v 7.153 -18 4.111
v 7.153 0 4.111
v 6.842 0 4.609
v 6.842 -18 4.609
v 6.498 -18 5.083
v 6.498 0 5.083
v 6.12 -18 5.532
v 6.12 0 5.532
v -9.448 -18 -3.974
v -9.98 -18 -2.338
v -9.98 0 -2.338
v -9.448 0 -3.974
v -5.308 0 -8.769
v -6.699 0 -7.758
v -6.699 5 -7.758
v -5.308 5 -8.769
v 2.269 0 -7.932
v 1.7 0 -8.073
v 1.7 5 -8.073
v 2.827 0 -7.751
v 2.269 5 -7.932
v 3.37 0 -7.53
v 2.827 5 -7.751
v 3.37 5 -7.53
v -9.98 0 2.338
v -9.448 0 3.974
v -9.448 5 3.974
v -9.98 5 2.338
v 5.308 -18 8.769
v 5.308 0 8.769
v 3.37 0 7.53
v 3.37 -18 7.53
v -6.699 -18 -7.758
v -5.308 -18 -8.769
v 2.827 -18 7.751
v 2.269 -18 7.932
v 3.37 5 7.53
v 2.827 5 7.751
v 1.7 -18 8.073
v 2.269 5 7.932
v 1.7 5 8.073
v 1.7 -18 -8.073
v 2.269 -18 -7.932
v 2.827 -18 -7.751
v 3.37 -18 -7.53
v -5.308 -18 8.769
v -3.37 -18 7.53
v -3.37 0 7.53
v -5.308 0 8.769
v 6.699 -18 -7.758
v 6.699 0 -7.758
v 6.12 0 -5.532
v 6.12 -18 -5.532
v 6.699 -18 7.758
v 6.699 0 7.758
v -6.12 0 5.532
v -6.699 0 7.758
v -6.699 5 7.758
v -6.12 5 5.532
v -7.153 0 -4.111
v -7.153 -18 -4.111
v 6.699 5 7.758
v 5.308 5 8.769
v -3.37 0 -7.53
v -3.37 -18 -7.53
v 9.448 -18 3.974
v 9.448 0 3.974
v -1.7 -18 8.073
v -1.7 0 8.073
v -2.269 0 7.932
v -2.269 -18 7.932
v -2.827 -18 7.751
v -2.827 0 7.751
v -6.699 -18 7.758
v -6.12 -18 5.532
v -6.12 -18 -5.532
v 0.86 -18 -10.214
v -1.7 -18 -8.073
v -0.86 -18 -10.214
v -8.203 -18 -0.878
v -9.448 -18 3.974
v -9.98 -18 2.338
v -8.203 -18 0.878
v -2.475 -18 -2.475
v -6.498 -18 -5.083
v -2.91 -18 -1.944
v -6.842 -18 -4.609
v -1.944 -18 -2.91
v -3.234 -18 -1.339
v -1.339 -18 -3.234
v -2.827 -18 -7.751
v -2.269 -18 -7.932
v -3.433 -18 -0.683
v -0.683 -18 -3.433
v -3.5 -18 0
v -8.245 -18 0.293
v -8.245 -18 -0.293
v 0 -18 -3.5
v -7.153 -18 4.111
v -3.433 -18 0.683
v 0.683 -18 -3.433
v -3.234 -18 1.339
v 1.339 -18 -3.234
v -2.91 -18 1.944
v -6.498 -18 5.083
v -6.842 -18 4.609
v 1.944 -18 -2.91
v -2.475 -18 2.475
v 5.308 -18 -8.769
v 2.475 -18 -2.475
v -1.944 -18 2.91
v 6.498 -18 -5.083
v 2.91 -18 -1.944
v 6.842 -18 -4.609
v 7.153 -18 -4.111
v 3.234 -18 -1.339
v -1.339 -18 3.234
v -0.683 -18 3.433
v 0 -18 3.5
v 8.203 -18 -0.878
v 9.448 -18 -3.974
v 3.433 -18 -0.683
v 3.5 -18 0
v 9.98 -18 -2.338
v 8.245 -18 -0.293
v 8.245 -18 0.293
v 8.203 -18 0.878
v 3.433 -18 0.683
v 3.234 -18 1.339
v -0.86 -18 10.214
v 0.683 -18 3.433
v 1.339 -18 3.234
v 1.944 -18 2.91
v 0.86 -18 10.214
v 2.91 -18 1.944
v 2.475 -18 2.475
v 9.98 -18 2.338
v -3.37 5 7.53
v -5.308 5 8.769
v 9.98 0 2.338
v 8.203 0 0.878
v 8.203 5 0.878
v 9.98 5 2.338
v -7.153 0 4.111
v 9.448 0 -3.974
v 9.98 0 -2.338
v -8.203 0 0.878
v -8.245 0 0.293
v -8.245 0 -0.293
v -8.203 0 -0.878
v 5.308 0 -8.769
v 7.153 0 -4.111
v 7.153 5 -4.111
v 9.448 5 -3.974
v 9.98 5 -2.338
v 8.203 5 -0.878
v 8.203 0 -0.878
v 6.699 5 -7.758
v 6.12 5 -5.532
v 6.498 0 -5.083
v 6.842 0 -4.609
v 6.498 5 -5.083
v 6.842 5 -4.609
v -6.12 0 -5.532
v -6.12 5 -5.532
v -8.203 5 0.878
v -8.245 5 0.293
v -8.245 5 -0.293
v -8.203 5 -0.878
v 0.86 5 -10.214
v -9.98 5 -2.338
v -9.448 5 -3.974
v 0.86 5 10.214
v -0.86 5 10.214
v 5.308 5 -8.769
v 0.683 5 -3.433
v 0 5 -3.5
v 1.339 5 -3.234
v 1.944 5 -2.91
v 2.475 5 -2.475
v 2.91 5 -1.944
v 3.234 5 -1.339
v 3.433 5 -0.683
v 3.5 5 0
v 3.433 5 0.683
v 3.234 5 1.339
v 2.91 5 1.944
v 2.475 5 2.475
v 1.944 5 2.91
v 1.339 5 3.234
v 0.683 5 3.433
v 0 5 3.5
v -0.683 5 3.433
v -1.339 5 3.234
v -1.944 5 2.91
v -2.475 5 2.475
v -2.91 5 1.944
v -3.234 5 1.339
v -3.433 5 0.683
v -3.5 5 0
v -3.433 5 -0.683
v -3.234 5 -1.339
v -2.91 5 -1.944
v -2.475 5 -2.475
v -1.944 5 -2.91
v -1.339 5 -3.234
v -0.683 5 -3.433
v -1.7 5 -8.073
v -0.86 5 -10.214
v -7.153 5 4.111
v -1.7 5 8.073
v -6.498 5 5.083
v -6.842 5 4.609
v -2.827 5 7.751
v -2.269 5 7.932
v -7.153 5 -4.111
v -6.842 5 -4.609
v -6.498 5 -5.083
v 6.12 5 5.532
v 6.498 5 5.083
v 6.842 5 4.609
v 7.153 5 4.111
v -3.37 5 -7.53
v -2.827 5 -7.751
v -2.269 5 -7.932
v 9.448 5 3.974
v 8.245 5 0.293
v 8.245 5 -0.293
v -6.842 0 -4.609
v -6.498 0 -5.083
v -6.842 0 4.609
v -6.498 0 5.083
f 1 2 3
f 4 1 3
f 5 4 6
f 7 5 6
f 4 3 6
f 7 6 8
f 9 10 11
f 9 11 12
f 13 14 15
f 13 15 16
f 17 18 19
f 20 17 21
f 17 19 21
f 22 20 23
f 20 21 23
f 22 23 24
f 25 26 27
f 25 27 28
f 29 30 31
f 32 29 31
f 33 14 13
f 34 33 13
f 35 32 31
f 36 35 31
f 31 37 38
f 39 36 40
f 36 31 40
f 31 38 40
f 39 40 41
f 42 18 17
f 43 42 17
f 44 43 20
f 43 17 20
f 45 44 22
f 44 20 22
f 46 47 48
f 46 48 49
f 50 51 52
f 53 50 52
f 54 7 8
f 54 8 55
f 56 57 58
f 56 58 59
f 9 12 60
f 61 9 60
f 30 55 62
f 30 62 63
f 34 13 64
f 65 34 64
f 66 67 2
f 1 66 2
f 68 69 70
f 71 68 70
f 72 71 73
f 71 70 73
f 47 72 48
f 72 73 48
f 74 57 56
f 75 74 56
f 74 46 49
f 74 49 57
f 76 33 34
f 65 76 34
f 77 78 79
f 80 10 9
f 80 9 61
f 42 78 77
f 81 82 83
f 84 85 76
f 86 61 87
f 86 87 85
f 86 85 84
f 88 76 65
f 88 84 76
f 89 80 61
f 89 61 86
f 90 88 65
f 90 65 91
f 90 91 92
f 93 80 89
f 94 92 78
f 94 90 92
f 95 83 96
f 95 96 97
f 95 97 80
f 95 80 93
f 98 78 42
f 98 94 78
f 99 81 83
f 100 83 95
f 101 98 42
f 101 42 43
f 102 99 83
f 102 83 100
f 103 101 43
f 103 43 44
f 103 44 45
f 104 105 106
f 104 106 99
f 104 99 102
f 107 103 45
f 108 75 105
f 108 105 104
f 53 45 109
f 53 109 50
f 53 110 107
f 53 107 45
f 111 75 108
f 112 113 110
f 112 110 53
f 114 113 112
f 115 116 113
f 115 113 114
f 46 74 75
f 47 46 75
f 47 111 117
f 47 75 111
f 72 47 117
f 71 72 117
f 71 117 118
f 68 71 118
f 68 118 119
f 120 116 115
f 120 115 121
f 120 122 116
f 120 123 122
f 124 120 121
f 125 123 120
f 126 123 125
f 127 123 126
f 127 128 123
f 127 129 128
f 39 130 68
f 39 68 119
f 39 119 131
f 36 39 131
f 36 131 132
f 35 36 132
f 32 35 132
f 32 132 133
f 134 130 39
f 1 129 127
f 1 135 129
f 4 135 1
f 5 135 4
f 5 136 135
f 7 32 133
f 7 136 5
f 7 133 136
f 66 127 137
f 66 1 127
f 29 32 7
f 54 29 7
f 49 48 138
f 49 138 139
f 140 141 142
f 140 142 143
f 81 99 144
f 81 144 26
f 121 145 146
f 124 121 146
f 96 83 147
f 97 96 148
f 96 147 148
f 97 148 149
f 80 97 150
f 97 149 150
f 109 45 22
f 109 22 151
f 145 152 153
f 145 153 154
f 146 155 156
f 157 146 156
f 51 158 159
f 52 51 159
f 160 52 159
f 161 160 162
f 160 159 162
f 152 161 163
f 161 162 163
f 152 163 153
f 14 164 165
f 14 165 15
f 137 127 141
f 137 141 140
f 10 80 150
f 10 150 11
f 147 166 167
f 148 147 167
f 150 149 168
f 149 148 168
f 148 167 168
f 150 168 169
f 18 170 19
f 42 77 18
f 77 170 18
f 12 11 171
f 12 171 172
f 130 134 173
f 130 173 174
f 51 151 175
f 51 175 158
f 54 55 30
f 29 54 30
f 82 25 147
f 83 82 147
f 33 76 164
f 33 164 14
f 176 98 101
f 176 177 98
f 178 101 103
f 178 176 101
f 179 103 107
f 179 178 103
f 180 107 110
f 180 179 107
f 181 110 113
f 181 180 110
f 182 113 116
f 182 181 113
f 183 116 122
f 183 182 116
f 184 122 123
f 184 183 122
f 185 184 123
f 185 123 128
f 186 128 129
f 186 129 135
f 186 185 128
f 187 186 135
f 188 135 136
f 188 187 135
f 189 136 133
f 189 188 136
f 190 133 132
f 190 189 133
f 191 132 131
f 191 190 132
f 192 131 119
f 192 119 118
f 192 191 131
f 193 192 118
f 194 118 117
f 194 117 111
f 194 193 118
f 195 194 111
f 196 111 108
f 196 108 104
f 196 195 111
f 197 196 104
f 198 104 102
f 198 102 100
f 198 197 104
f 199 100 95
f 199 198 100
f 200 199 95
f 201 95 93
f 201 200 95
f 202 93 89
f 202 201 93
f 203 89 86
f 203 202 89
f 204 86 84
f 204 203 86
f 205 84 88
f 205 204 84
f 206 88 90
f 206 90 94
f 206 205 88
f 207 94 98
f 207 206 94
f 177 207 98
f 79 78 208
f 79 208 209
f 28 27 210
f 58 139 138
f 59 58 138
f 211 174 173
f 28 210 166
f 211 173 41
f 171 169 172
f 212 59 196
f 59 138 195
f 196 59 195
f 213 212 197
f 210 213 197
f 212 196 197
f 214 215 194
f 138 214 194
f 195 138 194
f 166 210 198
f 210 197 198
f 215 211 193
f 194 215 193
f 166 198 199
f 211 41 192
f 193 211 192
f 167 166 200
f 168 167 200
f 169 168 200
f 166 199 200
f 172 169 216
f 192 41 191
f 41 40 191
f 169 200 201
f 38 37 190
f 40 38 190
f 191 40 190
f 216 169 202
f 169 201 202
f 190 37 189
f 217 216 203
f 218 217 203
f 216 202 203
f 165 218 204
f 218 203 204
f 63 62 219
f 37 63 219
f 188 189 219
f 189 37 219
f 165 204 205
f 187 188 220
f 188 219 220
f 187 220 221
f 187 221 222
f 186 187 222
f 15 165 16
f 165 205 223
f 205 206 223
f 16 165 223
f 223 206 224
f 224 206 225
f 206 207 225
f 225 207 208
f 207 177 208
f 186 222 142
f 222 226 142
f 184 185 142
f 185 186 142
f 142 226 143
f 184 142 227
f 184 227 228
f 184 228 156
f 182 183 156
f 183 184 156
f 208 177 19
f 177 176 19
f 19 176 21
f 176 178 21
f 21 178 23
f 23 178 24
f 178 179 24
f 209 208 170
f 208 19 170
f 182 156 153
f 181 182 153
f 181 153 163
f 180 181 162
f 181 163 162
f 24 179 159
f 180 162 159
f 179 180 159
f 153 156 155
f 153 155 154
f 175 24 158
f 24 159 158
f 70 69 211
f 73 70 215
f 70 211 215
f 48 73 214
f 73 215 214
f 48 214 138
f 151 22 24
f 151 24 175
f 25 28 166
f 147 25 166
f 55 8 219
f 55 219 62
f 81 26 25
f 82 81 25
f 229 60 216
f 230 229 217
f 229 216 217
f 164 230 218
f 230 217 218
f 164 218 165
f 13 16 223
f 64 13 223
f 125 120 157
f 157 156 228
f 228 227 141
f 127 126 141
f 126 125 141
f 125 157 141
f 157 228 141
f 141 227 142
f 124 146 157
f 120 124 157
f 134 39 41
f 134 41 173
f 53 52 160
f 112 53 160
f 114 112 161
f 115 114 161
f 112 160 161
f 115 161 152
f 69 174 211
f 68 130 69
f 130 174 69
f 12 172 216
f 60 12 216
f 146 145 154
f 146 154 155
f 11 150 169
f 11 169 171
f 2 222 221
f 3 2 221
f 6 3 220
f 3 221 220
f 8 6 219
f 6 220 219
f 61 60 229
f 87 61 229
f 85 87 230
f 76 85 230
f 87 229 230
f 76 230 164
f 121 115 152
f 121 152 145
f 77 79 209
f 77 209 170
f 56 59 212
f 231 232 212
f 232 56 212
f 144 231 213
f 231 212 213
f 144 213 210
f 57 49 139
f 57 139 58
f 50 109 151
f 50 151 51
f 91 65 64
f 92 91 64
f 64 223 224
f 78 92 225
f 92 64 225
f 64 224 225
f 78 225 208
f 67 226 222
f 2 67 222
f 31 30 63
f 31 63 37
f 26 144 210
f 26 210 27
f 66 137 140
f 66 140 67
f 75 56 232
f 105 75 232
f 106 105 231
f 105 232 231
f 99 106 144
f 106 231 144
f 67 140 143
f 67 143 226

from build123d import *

# Parameters (mm, degrees)
SKETCH1_R            = 3.5
BOSS_EXTRUDE1_DEPTH  = 5
SKETCH12_R           = 8.25
SKETCH12_R_2         = 3.5
BOSS_EXTRUDE6_DEPTH  = 5
BOSS_EXTRUDE9_DEPTH  = 5
CIRPATTERN2_COUNT    = 10
CUT_EXTRUDE1_START   = -10
SKETCH14_R           = 3.5
CUT_EXTRUDE1_DEPTH   = 10
SKETCH17_R           = 8.25
SKETCH17_R_2         = 3.5
BOSS_EXTRUDE10_DEPTH = 18


with BuildPart() as part:
    # Sketch1 → Boss-Extrude1 (new body)
    with BuildSketch(Plane(origin=(0, 0, 0), x_dir=(1, 0, 0), z_dir=(0, 1, 0))):
        with Locations(Location((0, 0, 0), (0, 0, 270))):
            Circle(SKETCH1_R)
    extrude(amount=BOSS_EXTRUDE1_DEPTH)

    # Sketch14 → Cut-Extrude1 (cut)
    with BuildSketch(Plane(origin=(0, 5, 0), x_dir=(1, 0, 0), z_dir=(0, 1, 0)).offset(CUT_EXTRUDE1_START)):
        with Locations(Location((0, 0, 0), (0, 0, 90))):
            Circle(SKETCH14_R)
    extrude(amount=CUT_EXTRUDE1_DEPTH, mode=Mode.SUBTRACT)


with BuildPart() as body_2:
    # Sketch12 → Boss-Extrude6 (new body)
    with BuildSketch(Plane(origin=(0, 5, 0), x_dir=(-1, 0, 0), z_dir=(0, -1, 0))):
        with Locations(Location((0, 0, 0), (0, 0, 90))):
            Circle(SKETCH12_R)
        with Locations(Location((0, 0, 0), (0, 0, 90))):
            Circle(SKETCH12_R_2, mode=Mode.SUBTRACT)
    extrude(amount=BOSS_EXTRUDE6_DEPTH)



with BuildPart() as body_3:
    # Sketch13 → Boss-Extrude9 (new body)
    with BuildSketch(Plane.XZ):
        with BuildLine():
            Line((1.7, 8.072948656), (0.86, 10.213858233))
            Line((0.86, 10.213858233), (-0.86, 10.213858233))
            Line((-0.86, 10.213858233), (-1.7, 8.072948656))
            ThreePointArc((-1.7, 8.072948656), (0, 8.25), (1.7, 8.072948656))
        make_face()
    extrude(amount=-BOSS_EXTRUDE9_DEPTH)


with BuildPart() as cirpattern2_1:
    # CirPattern2: pattern copy
    add(body_3.part.rotate(Axis((0, 0, 0), (0, 1, 0)), 1 * 360 / CIRPATTERN2_COUNT))


with BuildPart() as cirpattern2_2:
    # CirPattern2: pattern copy
    add(body_3.part.rotate(Axis((0, 0, 0), (0, 1, 0)), 2 * 360 / CIRPATTERN2_COUNT))


with BuildPart() as cirpattern2_3:
    # CirPattern2: pattern copy
    add(body_3.part.rotate(Axis((0, 0, 0), (0, 1, 0)), 3 * 360 / CIRPATTERN2_COUNT))


with BuildPart() as cirpattern2_4:
    # CirPattern2: pattern copy
    add(body_3.part.rotate(Axis((0, 0, 0), (0, 1, 0)), 4 * 360 / CIRPATTERN2_COUNT))


with BuildPart() as cirpattern2_5:
    # CirPattern2: pattern copy
    add(body_3.part.rotate(Axis((0, 0, 0), (0, 1, 0)), 5 * 360 / CIRPATTERN2_COUNT))


with BuildPart() as cirpattern2_6:
    # CirPattern2: pattern copy
    add(body_3.part.rotate(Axis((0, 0, 0), (0, 1, 0)), 6 * 360 / CIRPATTERN2_COUNT))


with BuildPart() as cirpattern2_7:
    # CirPattern2: pattern copy
    add(body_3.part.rotate(Axis((0, 0, 0), (0, 1, 0)), 7 * 360 / CIRPATTERN2_COUNT))


with BuildPart() as cirpattern2_8:
    # CirPattern2: pattern copy
    add(body_3.part.rotate(Axis((0, 0, 0), (0, 1, 0)), 8 * 360 / CIRPATTERN2_COUNT))


with BuildPart() as cirpattern2_9:
    # CirPattern2: pattern copy
    add(body_3.part.rotate(Axis((0, 0, 0), (0, 1, 0)), 9 * 360 / CIRPATTERN2_COUNT))


with BuildPart() as body_2_1:
    add(body_2.part)

    add(body_3.part)  # Boss-Extrude10 merges body 3

    add(cirpattern2_1.part)  # Boss-Extrude10 merges CirPattern2_1

    add(cirpattern2_2.part)  # Boss-Extrude10 merges CirPattern2_2

    add(cirpattern2_3.part)  # Boss-Extrude10 merges CirPattern2_3

    add(cirpattern2_4.part)  # Boss-Extrude10 merges CirPattern2_4

    add(cirpattern2_5.part)  # Boss-Extrude10 merges CirPattern2_5

    add(cirpattern2_6.part)  # Boss-Extrude10 merges CirPattern2_6

    add(cirpattern2_7.part)  # Boss-Extrude10 merges CirPattern2_7

    add(cirpattern2_8.part)  # Boss-Extrude10 merges CirPattern2_8

    add(cirpattern2_9.part)  # Boss-Extrude10 merges CirPattern2_9
    # Sketch17 → Boss-Extrude10 (add)
    # profile 1 of 11: a face of its own
    with BuildSketch(Plane.XZ):
        Circle(SKETCH17_R)
        with Locations(Location((0, 0, 0), (0, 0, 270))):
            Circle(SKETCH17_R_2, mode=Mode.SUBTRACT)
    # profile 2 of 11: a face of its own
    with BuildSketch(Plane.XZ):
        with BuildLine():
            ThreePointArc((-1.7, 8.072948656), (0, 8.25), (1.7, 8.072948656))
            Line((1.7, 8.072948656), (0.86, 10.213858233))
            Line((0.86, 10.213858233), (-0.86, 10.213858233))
            Line((-0.86, 10.213858233), (-1.7, 8.072948656))
        make_face()
    # profile 3 of 11: a face of its own
    with BuildSketch(Plane.XZ):
        with BuildLine():
            ThreePointArc((-6.120489053, 5.531917728), (-4.849228331, 6.674390204), (-3.369831272, 7.530387586))
            Line((-3.369831272, 7.530387586), (-5.307800623, 8.768680205))
            Line((-5.307800623, 8.768680205), (-6.699309853, 7.757689572))
            Line((-6.699309853, 7.757689572), (-6.120489053, 5.531917728))
        make_face()
    # profile 4 of 11: a face of its own
    with BuildSketch(Plane.XZ):
        with BuildLine():
            Line((-9.979711044, 2.338347168), (-8.203159315, 0.877882252))
            ThreePointArc((-8.203159315, 0.877882252), (-7.846216259, 2.549390204), (-7.152501534, 4.111474407))
            Line((-7.152501534, 4.111474407), (-9.448201814, 3.974164376))
            Line((-9.448201814, 3.974164376), (-9.979711044, 2.338347168))
        make_face()
    # profile 5 of 11: a face of its own
    with BuildSketch(Plane.XZ):
        with BuildLine():
            Line((-9.448201814, -3.974164376), (-7.152501534, -4.111474407))
            ThreePointArc((-7.152501534, -4.111474407), (-7.846216259, -2.549390204), (-8.203159315, -0.877882252))
            Line((-8.203159315, -0.877882252), (-9.979711044, -2.338347168))
            Line((-9.979711044, -2.338347168), (-9.448201814, -3.974164376))
        make_face()
    # profile 6 of 11: a face of its own
    with BuildSketch(Plane.XZ):
        with BuildLine():
            Line((-5.307800623, -8.768680205), (-3.369831272, -7.530387586))
            ThreePointArc((-3.369831272, -7.530387586), (-4.849228331, -6.674390204), (-6.120489053, -5.531917728))
            Line((-6.120489053, -5.531917728), (-6.699309853, -7.757689572))
            Line((-6.699309853, -7.757689572), (-5.307800623, -8.768680205))
        make_face()
    # profile 7 of 11: a face of its own
    with BuildSketch(Plane.XZ):
        with BuildLine():
            Line((0.86, -10.213858233), (1.7, -8.072948656))
            ThreePointArc((1.7, -8.072948656), (0, -8.25), (-1.7, -8.072948656))
            Line((-1.7, -8.072948656), (-0.86, -10.213858233))
            Line((-0.86, -10.213858233), (0.86, -10.213858233))
        make_face()
    # profile 8 of 11: a face of its own
    with BuildSketch(Plane.XZ):
        with BuildLine():
            Line((6.699309853, -7.757689572), (6.120489053, -5.531917728))
            ThreePointArc((6.120489053, -5.531917728), (4.849228331, -6.674390204), (3.369831272, -7.530387586))
            Line((3.369831272, -7.530387586), (5.307800623, -8.768680205))
            Line((5.307800623, -8.768680205), (6.699309853, -7.757689572))
        make_face()
    # profile 9 of 11: a face of its own
    with BuildSketch(Plane.XZ):
        with BuildLine():
            Line((7.152501534, -4.111474407), (9.448201814, -3.974164376))
            Line((9.448201814, -3.974164376), (9.979711044, -2.338347168))
            Line((9.979711044, -2.338347168), (8.203159315, -0.877882252))
            ThreePointArc((8.203159315, -0.877882252), (7.846216259, -2.549390204), (7.152501534, -4.111474407))
        make_face()
    # profile 10 of 11: a face of its own
    with BuildSketch(Plane.XZ):
        with BuildLine():
            ThreePointArc((7.152501534, 4.111474407), (7.846216259, 2.549390204), (8.203159315, 0.877882252))
            Line((8.203159315, 0.877882252), (9.979711044, 2.338347168))
            Line((9.979711044, 2.338347168), (9.448201814, 3.974164376))
            Line((9.448201814, 3.974164376), (7.152501534, 4.111474407))
        make_face()
    # profile 11 of 11: a face of its own
    with BuildSketch(Plane.XZ):
        with BuildLine():
            ThreePointArc((3.369831272, 7.530387586), (4.849228331, 6.674390204), (6.120489053, 5.531917728))
            Line((6.120489053, 5.531917728), (6.699309853, 7.757689572))
            Line((6.699309853, 7.757689572), (5.307800623, 8.768680205))
            Line((5.307800623, 8.768680205), (3.369831272, 7.530387586))
        make_face()
    extrude(amount=BOSS_EXTRUDE10_DEPTH)


solid = body_2_1.part
